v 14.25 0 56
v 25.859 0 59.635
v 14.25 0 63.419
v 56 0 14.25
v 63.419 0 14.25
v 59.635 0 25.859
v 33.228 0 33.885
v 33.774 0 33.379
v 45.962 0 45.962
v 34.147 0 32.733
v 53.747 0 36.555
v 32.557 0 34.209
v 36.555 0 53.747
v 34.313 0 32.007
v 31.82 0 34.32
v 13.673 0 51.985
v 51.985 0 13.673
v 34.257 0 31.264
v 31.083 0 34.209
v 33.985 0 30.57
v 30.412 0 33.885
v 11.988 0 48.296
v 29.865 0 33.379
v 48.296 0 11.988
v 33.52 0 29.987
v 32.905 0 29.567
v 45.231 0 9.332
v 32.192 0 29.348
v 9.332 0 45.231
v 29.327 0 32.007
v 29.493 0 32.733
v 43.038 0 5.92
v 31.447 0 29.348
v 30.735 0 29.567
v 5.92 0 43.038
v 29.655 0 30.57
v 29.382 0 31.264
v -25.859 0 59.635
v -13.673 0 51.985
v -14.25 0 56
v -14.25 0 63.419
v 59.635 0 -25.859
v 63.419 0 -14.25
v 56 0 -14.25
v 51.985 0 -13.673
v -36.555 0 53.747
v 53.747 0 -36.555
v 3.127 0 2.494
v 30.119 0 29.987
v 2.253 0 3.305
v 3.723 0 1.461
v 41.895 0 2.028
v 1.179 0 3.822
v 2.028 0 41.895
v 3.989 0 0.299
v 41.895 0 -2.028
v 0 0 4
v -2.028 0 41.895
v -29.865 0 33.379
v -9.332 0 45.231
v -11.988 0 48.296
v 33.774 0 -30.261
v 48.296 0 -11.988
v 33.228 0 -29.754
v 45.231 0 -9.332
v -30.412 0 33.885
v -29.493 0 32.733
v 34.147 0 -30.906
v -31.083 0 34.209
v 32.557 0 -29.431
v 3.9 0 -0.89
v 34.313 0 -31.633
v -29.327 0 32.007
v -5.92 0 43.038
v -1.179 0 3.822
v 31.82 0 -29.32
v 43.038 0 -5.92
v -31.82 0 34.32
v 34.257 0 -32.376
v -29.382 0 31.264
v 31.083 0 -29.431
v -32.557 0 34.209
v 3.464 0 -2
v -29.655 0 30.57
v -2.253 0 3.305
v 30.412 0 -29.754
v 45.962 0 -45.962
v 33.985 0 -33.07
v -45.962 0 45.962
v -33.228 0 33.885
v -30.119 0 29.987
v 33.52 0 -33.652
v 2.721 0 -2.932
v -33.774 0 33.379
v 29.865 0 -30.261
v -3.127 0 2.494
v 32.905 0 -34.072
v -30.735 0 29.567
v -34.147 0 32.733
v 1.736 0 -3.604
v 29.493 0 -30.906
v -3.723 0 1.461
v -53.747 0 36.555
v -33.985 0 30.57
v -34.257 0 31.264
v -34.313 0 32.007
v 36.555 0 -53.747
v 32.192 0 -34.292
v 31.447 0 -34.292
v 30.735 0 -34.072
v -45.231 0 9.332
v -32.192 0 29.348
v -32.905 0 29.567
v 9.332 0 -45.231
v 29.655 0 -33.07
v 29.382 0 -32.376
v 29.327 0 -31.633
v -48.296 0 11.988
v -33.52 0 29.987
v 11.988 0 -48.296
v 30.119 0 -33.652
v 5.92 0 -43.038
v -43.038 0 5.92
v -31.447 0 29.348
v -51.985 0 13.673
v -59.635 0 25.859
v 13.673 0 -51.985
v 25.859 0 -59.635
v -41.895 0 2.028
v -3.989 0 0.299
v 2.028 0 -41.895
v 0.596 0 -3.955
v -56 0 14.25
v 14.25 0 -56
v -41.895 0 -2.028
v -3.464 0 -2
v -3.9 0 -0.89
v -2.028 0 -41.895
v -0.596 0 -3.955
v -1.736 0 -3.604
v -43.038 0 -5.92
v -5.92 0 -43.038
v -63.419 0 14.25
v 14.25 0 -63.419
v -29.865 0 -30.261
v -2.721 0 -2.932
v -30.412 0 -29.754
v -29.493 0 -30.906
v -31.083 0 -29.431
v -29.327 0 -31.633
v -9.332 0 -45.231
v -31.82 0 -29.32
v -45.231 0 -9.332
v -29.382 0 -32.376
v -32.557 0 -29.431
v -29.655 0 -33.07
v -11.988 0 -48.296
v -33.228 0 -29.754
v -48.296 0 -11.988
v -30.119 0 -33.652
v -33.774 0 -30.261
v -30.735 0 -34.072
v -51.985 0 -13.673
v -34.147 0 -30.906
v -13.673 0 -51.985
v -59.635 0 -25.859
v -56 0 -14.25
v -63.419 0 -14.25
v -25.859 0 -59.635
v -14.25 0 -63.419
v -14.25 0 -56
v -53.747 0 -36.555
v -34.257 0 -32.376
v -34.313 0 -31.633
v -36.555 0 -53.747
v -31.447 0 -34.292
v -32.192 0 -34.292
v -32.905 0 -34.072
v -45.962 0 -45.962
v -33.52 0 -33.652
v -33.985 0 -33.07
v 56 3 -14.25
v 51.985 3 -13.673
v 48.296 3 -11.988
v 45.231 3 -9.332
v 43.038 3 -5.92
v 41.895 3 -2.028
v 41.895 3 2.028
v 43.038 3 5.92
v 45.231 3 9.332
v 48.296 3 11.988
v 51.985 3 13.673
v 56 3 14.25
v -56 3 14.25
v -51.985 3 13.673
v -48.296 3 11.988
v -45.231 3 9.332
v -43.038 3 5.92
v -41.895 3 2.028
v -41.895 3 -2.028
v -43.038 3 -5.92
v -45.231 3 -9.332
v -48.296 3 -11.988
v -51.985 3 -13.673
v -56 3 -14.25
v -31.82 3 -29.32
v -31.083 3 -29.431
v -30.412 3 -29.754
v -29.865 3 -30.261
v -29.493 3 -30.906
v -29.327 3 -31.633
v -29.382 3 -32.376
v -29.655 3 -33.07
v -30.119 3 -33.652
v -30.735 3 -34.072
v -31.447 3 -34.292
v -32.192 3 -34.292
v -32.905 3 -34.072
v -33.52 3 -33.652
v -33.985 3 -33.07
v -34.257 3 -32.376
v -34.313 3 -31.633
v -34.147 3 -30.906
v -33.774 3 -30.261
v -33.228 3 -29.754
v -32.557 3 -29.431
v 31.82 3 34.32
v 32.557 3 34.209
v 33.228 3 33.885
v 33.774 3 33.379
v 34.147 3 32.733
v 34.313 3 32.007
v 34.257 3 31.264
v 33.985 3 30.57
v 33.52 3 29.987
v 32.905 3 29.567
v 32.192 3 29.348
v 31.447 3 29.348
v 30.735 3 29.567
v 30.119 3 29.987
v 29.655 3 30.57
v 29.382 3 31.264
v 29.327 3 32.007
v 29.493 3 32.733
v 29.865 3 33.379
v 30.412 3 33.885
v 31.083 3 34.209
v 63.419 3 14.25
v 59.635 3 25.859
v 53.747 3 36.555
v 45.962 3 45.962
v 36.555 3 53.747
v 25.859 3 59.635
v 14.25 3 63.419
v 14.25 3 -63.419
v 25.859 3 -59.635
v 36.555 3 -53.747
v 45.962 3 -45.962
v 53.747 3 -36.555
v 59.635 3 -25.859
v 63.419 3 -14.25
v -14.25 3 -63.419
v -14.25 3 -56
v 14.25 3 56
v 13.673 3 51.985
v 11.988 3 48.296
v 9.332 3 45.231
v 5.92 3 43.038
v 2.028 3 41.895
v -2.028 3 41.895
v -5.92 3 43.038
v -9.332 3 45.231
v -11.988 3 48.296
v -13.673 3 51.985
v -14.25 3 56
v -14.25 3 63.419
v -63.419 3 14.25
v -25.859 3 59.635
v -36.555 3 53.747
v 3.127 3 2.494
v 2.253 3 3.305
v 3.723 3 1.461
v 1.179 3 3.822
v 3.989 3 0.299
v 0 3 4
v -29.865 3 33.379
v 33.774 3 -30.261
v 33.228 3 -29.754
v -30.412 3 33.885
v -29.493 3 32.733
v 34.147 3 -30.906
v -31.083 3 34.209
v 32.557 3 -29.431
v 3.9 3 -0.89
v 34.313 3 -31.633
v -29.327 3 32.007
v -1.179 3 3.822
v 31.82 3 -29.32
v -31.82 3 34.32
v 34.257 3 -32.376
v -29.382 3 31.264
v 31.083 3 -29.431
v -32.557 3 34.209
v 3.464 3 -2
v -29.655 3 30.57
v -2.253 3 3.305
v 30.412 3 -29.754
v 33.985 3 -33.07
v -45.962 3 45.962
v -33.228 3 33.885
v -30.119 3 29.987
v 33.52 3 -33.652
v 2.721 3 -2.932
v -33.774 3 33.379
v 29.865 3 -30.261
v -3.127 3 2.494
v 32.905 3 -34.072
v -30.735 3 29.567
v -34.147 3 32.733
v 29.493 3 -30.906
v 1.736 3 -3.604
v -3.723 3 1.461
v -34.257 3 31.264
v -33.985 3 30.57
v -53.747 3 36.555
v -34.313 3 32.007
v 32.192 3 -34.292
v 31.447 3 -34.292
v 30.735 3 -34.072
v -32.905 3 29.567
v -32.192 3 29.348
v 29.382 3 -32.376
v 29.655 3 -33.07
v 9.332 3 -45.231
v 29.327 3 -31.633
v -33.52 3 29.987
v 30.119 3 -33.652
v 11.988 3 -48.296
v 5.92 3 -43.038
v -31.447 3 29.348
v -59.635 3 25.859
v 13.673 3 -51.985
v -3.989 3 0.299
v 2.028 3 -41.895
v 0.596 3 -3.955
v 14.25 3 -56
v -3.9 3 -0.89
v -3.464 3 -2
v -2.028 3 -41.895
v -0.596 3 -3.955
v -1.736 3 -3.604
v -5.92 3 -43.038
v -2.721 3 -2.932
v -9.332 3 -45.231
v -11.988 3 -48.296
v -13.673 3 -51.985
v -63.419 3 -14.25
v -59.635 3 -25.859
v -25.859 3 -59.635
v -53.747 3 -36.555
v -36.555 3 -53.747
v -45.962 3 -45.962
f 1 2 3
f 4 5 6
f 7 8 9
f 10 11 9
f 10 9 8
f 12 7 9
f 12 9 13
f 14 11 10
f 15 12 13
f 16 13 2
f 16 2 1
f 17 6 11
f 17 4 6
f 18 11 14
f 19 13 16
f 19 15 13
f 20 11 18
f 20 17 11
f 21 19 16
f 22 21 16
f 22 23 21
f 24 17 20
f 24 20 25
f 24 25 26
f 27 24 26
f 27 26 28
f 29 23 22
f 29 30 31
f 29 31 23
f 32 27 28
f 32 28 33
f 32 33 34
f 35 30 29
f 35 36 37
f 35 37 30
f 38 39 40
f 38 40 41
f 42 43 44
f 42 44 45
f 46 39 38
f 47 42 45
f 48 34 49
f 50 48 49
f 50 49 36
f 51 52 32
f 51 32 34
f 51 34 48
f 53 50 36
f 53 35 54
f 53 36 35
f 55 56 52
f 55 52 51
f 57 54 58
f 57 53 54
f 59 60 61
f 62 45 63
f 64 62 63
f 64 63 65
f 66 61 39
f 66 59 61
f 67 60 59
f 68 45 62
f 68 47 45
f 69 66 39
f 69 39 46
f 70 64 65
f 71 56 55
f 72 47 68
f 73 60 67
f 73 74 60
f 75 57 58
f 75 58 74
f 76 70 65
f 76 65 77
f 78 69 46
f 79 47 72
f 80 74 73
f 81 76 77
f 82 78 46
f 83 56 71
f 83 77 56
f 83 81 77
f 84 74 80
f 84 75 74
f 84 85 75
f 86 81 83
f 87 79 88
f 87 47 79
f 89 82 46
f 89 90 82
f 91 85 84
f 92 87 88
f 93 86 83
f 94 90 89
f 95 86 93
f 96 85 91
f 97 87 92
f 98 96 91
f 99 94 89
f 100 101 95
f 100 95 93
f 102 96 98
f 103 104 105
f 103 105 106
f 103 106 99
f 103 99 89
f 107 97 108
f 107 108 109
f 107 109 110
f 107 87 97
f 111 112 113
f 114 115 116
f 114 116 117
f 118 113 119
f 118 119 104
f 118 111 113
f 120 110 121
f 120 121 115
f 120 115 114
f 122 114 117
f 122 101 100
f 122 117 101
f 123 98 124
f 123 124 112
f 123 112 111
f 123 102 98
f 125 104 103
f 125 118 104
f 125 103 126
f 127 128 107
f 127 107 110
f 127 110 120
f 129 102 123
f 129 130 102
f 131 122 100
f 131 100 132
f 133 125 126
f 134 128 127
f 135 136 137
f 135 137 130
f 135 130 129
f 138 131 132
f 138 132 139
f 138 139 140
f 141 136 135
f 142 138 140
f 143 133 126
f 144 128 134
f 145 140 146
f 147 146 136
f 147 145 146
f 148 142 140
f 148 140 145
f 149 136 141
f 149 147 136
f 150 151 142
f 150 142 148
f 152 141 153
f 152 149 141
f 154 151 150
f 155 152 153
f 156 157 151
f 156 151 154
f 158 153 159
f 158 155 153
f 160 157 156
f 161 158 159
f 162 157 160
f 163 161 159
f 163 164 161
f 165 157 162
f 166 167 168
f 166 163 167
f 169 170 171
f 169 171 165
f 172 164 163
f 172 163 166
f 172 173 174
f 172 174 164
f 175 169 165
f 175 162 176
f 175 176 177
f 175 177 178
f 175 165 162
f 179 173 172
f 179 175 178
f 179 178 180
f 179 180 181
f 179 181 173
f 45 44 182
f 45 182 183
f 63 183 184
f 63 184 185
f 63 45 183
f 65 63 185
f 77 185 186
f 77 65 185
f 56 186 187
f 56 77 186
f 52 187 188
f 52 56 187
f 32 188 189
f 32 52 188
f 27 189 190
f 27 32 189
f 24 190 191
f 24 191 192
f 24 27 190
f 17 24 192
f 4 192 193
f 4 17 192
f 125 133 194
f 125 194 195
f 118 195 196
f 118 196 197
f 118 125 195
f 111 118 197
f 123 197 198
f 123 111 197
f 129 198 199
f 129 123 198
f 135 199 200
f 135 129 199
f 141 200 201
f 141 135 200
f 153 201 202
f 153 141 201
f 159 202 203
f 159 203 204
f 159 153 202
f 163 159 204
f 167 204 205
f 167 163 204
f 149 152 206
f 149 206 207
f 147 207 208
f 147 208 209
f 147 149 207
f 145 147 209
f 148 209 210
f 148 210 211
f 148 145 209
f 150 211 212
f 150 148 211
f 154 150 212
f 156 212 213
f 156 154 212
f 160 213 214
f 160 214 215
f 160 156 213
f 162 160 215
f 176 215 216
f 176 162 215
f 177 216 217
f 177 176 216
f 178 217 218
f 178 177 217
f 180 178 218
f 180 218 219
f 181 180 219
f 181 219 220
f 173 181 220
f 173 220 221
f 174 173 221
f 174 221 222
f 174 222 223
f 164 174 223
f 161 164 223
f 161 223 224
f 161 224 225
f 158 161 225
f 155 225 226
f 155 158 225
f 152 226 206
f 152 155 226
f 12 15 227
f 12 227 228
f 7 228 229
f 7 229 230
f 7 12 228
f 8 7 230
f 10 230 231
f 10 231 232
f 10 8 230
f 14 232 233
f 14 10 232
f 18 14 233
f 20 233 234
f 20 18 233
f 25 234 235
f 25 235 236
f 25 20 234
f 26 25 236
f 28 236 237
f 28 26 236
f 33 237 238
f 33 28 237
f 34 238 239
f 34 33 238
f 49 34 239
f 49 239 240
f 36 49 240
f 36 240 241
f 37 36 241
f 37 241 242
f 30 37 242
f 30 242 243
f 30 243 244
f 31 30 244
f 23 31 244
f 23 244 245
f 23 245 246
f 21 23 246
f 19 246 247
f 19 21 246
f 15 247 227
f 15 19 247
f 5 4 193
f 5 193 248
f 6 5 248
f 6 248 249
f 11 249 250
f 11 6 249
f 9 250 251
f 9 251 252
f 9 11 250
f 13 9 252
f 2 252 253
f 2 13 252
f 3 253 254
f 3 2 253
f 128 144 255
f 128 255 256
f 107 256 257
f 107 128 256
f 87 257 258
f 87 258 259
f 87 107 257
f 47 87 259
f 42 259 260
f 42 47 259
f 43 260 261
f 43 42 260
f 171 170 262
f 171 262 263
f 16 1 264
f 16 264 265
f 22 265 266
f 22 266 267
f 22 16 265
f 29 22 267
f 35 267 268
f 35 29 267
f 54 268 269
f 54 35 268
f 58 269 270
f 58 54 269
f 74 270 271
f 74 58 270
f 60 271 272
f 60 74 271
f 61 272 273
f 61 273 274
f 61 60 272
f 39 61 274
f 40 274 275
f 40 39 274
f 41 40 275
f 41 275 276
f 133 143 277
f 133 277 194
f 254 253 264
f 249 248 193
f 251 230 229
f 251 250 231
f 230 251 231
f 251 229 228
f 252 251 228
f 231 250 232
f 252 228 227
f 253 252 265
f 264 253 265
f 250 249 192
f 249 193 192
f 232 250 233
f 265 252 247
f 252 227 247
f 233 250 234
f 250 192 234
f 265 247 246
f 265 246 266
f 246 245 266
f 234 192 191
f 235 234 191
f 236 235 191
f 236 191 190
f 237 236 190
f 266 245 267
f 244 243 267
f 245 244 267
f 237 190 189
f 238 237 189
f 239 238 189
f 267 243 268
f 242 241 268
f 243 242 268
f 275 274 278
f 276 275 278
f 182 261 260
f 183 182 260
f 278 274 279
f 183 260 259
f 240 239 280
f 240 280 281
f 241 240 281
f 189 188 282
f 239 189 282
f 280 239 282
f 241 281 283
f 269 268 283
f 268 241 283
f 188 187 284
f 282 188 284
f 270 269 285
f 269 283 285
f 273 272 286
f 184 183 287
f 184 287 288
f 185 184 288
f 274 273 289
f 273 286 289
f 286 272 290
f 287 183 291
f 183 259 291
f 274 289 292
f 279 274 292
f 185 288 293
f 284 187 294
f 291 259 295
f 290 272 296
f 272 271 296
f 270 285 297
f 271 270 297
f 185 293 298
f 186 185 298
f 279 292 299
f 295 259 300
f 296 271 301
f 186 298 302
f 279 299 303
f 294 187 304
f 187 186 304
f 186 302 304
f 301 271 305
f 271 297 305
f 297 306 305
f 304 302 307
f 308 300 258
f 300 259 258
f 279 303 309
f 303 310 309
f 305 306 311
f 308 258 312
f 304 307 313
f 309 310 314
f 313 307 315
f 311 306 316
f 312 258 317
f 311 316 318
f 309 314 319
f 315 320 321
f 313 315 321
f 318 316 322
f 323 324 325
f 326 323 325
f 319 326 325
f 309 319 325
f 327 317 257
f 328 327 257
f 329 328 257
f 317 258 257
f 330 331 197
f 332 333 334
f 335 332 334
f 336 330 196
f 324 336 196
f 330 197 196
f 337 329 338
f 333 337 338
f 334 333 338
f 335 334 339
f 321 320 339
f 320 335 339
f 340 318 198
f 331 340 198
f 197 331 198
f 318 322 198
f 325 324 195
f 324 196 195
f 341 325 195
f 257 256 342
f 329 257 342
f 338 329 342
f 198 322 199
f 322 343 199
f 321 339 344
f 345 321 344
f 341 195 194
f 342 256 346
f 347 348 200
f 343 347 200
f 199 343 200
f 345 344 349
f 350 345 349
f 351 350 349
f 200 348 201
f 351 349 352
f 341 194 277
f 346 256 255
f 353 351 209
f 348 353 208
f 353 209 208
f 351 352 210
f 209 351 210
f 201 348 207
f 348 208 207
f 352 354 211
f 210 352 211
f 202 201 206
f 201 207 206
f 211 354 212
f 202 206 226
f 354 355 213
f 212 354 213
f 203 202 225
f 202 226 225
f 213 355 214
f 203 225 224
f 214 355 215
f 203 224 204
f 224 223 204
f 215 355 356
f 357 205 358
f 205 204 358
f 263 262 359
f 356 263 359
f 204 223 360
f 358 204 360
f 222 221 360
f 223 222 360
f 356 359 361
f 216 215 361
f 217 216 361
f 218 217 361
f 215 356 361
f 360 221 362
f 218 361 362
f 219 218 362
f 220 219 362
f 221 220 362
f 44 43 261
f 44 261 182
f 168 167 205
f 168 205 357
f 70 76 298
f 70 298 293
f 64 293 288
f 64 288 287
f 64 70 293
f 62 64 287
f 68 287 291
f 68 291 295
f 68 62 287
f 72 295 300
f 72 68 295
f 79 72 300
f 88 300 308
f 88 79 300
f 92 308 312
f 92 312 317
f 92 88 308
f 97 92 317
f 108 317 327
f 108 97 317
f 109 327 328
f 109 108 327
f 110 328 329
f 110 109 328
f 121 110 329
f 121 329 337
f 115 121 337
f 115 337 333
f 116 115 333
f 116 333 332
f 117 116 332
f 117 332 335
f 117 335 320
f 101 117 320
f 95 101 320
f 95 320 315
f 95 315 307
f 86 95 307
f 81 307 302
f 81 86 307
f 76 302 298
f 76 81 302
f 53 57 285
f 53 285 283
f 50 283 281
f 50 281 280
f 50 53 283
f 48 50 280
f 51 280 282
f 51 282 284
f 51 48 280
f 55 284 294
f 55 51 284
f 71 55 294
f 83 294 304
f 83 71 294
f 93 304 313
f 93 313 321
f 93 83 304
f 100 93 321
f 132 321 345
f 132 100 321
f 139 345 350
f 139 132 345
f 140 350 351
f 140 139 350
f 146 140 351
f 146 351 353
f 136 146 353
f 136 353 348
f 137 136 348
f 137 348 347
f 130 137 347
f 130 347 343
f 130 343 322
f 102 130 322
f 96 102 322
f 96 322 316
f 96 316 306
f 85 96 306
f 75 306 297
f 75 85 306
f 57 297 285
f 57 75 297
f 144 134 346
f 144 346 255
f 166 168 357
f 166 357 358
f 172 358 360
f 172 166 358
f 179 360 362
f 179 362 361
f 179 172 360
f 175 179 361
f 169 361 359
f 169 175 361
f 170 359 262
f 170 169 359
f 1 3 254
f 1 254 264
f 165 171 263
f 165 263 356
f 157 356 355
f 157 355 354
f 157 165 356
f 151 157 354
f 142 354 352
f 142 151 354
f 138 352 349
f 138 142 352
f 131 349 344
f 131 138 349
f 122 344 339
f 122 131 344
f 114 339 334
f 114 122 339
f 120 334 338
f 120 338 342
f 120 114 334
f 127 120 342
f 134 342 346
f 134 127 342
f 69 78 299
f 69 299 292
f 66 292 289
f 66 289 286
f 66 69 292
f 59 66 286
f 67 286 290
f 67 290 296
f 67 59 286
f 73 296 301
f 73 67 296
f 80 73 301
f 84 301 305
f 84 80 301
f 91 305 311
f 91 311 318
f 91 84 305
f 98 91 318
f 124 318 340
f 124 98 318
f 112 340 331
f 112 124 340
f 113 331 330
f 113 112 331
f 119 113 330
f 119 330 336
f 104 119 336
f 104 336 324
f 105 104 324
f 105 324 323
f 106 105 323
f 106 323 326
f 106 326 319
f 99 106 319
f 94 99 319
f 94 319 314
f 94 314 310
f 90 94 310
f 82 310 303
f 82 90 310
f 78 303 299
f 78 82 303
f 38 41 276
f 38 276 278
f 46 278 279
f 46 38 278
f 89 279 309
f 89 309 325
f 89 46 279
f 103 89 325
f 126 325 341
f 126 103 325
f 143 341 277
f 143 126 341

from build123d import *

# Parameters (mm, degrees)
SKETCH1_R           = 2.5
SKETCH1_R_2         = 4
BOSS_EXTRUDE1_DEPTH = 3


with BuildPart() as part:
    # Sketch1 → Boss-Extrude1 (new body)
    with BuildSketch(Plane(origin=(0, 0, 0), x_dir=(1, 0, 0), z_dir=(0, 1, 0))):
        with BuildLine():
            Line((-56, 14.25), (-63.418747228, 14.25))
            ThreePointArc((-63.418747228, 14.25), (-45.961940777, 45.961940777), (-14.25, 63.418747228))
            Line((-14.25, 63.418747228), (-14.25, 56))
            ThreePointArc((-14.25, 56), (0, 41.75), (14.25, 56))
            Line((14.25, 56), (14.25, 63.418747228))
            ThreePointArc((14.25, 63.418747228), (45.961940777, 45.961940777), (63.418747228, 14.25))
            Line((63.418747228, 14.25), (56, 14.25))
            ThreePointArc((56, 14.25), (41.75, 0), (56, -14.25))
            Line((56, -14.25), (63.418747228, -14.25))
            ThreePointArc((63.418747228, -14.25), (45.961940777, -45.961940777), (14.25, -63.418747228))
            Line((14.25, -63.418747228), (14.25, -56))
            ThreePointArc((14.25, -56), (0, -41.75), (-14.25, -56))
            Line((-14.25, -56), (-14.25, -63.418747228))
            ThreePointArc((-14.25, -63.418747228), (-45.961940777, -45.961940777), (-63.418747228, -14.25))
            Line((-63.418747228, -14.25), (-56, -14.25))
            ThreePointArc((-56, -14.25), (-41.75, 0), (-56, 14.25))
        make_face()
        with Locations(Location((-31.819805153, 31.819805153, 0), (0, 0, 270))):
            Circle(SKETCH1_R, mode=Mode.SUBTRACT)
        with Locations(Location((31.819805153, 31.819805153, 0), (0, 0, 270))):
            Circle(SKETCH1_R, mode=Mode.SUBTRACT)
        with Locations(Location((31.819805153, -31.819805153, 0), (0, 0, 270))):
            Circle(SKETCH1_R, mode=Mode.SUBTRACT)
        with Locations(Location((-31.819805153, -31.819805153, 0), (0, 0, 270))):
            Circle(SKETCH1_R, mode=Mode.SUBTRACT)
        with Locations(Location((0, 0, 0), (0, 0, 270))):
            Circle(SKETCH1_R_2, mode=Mode.SUBTRACT)
    extrude(amount=BOSS_EXTRUDE1_DEPTH)


solid = part.part
